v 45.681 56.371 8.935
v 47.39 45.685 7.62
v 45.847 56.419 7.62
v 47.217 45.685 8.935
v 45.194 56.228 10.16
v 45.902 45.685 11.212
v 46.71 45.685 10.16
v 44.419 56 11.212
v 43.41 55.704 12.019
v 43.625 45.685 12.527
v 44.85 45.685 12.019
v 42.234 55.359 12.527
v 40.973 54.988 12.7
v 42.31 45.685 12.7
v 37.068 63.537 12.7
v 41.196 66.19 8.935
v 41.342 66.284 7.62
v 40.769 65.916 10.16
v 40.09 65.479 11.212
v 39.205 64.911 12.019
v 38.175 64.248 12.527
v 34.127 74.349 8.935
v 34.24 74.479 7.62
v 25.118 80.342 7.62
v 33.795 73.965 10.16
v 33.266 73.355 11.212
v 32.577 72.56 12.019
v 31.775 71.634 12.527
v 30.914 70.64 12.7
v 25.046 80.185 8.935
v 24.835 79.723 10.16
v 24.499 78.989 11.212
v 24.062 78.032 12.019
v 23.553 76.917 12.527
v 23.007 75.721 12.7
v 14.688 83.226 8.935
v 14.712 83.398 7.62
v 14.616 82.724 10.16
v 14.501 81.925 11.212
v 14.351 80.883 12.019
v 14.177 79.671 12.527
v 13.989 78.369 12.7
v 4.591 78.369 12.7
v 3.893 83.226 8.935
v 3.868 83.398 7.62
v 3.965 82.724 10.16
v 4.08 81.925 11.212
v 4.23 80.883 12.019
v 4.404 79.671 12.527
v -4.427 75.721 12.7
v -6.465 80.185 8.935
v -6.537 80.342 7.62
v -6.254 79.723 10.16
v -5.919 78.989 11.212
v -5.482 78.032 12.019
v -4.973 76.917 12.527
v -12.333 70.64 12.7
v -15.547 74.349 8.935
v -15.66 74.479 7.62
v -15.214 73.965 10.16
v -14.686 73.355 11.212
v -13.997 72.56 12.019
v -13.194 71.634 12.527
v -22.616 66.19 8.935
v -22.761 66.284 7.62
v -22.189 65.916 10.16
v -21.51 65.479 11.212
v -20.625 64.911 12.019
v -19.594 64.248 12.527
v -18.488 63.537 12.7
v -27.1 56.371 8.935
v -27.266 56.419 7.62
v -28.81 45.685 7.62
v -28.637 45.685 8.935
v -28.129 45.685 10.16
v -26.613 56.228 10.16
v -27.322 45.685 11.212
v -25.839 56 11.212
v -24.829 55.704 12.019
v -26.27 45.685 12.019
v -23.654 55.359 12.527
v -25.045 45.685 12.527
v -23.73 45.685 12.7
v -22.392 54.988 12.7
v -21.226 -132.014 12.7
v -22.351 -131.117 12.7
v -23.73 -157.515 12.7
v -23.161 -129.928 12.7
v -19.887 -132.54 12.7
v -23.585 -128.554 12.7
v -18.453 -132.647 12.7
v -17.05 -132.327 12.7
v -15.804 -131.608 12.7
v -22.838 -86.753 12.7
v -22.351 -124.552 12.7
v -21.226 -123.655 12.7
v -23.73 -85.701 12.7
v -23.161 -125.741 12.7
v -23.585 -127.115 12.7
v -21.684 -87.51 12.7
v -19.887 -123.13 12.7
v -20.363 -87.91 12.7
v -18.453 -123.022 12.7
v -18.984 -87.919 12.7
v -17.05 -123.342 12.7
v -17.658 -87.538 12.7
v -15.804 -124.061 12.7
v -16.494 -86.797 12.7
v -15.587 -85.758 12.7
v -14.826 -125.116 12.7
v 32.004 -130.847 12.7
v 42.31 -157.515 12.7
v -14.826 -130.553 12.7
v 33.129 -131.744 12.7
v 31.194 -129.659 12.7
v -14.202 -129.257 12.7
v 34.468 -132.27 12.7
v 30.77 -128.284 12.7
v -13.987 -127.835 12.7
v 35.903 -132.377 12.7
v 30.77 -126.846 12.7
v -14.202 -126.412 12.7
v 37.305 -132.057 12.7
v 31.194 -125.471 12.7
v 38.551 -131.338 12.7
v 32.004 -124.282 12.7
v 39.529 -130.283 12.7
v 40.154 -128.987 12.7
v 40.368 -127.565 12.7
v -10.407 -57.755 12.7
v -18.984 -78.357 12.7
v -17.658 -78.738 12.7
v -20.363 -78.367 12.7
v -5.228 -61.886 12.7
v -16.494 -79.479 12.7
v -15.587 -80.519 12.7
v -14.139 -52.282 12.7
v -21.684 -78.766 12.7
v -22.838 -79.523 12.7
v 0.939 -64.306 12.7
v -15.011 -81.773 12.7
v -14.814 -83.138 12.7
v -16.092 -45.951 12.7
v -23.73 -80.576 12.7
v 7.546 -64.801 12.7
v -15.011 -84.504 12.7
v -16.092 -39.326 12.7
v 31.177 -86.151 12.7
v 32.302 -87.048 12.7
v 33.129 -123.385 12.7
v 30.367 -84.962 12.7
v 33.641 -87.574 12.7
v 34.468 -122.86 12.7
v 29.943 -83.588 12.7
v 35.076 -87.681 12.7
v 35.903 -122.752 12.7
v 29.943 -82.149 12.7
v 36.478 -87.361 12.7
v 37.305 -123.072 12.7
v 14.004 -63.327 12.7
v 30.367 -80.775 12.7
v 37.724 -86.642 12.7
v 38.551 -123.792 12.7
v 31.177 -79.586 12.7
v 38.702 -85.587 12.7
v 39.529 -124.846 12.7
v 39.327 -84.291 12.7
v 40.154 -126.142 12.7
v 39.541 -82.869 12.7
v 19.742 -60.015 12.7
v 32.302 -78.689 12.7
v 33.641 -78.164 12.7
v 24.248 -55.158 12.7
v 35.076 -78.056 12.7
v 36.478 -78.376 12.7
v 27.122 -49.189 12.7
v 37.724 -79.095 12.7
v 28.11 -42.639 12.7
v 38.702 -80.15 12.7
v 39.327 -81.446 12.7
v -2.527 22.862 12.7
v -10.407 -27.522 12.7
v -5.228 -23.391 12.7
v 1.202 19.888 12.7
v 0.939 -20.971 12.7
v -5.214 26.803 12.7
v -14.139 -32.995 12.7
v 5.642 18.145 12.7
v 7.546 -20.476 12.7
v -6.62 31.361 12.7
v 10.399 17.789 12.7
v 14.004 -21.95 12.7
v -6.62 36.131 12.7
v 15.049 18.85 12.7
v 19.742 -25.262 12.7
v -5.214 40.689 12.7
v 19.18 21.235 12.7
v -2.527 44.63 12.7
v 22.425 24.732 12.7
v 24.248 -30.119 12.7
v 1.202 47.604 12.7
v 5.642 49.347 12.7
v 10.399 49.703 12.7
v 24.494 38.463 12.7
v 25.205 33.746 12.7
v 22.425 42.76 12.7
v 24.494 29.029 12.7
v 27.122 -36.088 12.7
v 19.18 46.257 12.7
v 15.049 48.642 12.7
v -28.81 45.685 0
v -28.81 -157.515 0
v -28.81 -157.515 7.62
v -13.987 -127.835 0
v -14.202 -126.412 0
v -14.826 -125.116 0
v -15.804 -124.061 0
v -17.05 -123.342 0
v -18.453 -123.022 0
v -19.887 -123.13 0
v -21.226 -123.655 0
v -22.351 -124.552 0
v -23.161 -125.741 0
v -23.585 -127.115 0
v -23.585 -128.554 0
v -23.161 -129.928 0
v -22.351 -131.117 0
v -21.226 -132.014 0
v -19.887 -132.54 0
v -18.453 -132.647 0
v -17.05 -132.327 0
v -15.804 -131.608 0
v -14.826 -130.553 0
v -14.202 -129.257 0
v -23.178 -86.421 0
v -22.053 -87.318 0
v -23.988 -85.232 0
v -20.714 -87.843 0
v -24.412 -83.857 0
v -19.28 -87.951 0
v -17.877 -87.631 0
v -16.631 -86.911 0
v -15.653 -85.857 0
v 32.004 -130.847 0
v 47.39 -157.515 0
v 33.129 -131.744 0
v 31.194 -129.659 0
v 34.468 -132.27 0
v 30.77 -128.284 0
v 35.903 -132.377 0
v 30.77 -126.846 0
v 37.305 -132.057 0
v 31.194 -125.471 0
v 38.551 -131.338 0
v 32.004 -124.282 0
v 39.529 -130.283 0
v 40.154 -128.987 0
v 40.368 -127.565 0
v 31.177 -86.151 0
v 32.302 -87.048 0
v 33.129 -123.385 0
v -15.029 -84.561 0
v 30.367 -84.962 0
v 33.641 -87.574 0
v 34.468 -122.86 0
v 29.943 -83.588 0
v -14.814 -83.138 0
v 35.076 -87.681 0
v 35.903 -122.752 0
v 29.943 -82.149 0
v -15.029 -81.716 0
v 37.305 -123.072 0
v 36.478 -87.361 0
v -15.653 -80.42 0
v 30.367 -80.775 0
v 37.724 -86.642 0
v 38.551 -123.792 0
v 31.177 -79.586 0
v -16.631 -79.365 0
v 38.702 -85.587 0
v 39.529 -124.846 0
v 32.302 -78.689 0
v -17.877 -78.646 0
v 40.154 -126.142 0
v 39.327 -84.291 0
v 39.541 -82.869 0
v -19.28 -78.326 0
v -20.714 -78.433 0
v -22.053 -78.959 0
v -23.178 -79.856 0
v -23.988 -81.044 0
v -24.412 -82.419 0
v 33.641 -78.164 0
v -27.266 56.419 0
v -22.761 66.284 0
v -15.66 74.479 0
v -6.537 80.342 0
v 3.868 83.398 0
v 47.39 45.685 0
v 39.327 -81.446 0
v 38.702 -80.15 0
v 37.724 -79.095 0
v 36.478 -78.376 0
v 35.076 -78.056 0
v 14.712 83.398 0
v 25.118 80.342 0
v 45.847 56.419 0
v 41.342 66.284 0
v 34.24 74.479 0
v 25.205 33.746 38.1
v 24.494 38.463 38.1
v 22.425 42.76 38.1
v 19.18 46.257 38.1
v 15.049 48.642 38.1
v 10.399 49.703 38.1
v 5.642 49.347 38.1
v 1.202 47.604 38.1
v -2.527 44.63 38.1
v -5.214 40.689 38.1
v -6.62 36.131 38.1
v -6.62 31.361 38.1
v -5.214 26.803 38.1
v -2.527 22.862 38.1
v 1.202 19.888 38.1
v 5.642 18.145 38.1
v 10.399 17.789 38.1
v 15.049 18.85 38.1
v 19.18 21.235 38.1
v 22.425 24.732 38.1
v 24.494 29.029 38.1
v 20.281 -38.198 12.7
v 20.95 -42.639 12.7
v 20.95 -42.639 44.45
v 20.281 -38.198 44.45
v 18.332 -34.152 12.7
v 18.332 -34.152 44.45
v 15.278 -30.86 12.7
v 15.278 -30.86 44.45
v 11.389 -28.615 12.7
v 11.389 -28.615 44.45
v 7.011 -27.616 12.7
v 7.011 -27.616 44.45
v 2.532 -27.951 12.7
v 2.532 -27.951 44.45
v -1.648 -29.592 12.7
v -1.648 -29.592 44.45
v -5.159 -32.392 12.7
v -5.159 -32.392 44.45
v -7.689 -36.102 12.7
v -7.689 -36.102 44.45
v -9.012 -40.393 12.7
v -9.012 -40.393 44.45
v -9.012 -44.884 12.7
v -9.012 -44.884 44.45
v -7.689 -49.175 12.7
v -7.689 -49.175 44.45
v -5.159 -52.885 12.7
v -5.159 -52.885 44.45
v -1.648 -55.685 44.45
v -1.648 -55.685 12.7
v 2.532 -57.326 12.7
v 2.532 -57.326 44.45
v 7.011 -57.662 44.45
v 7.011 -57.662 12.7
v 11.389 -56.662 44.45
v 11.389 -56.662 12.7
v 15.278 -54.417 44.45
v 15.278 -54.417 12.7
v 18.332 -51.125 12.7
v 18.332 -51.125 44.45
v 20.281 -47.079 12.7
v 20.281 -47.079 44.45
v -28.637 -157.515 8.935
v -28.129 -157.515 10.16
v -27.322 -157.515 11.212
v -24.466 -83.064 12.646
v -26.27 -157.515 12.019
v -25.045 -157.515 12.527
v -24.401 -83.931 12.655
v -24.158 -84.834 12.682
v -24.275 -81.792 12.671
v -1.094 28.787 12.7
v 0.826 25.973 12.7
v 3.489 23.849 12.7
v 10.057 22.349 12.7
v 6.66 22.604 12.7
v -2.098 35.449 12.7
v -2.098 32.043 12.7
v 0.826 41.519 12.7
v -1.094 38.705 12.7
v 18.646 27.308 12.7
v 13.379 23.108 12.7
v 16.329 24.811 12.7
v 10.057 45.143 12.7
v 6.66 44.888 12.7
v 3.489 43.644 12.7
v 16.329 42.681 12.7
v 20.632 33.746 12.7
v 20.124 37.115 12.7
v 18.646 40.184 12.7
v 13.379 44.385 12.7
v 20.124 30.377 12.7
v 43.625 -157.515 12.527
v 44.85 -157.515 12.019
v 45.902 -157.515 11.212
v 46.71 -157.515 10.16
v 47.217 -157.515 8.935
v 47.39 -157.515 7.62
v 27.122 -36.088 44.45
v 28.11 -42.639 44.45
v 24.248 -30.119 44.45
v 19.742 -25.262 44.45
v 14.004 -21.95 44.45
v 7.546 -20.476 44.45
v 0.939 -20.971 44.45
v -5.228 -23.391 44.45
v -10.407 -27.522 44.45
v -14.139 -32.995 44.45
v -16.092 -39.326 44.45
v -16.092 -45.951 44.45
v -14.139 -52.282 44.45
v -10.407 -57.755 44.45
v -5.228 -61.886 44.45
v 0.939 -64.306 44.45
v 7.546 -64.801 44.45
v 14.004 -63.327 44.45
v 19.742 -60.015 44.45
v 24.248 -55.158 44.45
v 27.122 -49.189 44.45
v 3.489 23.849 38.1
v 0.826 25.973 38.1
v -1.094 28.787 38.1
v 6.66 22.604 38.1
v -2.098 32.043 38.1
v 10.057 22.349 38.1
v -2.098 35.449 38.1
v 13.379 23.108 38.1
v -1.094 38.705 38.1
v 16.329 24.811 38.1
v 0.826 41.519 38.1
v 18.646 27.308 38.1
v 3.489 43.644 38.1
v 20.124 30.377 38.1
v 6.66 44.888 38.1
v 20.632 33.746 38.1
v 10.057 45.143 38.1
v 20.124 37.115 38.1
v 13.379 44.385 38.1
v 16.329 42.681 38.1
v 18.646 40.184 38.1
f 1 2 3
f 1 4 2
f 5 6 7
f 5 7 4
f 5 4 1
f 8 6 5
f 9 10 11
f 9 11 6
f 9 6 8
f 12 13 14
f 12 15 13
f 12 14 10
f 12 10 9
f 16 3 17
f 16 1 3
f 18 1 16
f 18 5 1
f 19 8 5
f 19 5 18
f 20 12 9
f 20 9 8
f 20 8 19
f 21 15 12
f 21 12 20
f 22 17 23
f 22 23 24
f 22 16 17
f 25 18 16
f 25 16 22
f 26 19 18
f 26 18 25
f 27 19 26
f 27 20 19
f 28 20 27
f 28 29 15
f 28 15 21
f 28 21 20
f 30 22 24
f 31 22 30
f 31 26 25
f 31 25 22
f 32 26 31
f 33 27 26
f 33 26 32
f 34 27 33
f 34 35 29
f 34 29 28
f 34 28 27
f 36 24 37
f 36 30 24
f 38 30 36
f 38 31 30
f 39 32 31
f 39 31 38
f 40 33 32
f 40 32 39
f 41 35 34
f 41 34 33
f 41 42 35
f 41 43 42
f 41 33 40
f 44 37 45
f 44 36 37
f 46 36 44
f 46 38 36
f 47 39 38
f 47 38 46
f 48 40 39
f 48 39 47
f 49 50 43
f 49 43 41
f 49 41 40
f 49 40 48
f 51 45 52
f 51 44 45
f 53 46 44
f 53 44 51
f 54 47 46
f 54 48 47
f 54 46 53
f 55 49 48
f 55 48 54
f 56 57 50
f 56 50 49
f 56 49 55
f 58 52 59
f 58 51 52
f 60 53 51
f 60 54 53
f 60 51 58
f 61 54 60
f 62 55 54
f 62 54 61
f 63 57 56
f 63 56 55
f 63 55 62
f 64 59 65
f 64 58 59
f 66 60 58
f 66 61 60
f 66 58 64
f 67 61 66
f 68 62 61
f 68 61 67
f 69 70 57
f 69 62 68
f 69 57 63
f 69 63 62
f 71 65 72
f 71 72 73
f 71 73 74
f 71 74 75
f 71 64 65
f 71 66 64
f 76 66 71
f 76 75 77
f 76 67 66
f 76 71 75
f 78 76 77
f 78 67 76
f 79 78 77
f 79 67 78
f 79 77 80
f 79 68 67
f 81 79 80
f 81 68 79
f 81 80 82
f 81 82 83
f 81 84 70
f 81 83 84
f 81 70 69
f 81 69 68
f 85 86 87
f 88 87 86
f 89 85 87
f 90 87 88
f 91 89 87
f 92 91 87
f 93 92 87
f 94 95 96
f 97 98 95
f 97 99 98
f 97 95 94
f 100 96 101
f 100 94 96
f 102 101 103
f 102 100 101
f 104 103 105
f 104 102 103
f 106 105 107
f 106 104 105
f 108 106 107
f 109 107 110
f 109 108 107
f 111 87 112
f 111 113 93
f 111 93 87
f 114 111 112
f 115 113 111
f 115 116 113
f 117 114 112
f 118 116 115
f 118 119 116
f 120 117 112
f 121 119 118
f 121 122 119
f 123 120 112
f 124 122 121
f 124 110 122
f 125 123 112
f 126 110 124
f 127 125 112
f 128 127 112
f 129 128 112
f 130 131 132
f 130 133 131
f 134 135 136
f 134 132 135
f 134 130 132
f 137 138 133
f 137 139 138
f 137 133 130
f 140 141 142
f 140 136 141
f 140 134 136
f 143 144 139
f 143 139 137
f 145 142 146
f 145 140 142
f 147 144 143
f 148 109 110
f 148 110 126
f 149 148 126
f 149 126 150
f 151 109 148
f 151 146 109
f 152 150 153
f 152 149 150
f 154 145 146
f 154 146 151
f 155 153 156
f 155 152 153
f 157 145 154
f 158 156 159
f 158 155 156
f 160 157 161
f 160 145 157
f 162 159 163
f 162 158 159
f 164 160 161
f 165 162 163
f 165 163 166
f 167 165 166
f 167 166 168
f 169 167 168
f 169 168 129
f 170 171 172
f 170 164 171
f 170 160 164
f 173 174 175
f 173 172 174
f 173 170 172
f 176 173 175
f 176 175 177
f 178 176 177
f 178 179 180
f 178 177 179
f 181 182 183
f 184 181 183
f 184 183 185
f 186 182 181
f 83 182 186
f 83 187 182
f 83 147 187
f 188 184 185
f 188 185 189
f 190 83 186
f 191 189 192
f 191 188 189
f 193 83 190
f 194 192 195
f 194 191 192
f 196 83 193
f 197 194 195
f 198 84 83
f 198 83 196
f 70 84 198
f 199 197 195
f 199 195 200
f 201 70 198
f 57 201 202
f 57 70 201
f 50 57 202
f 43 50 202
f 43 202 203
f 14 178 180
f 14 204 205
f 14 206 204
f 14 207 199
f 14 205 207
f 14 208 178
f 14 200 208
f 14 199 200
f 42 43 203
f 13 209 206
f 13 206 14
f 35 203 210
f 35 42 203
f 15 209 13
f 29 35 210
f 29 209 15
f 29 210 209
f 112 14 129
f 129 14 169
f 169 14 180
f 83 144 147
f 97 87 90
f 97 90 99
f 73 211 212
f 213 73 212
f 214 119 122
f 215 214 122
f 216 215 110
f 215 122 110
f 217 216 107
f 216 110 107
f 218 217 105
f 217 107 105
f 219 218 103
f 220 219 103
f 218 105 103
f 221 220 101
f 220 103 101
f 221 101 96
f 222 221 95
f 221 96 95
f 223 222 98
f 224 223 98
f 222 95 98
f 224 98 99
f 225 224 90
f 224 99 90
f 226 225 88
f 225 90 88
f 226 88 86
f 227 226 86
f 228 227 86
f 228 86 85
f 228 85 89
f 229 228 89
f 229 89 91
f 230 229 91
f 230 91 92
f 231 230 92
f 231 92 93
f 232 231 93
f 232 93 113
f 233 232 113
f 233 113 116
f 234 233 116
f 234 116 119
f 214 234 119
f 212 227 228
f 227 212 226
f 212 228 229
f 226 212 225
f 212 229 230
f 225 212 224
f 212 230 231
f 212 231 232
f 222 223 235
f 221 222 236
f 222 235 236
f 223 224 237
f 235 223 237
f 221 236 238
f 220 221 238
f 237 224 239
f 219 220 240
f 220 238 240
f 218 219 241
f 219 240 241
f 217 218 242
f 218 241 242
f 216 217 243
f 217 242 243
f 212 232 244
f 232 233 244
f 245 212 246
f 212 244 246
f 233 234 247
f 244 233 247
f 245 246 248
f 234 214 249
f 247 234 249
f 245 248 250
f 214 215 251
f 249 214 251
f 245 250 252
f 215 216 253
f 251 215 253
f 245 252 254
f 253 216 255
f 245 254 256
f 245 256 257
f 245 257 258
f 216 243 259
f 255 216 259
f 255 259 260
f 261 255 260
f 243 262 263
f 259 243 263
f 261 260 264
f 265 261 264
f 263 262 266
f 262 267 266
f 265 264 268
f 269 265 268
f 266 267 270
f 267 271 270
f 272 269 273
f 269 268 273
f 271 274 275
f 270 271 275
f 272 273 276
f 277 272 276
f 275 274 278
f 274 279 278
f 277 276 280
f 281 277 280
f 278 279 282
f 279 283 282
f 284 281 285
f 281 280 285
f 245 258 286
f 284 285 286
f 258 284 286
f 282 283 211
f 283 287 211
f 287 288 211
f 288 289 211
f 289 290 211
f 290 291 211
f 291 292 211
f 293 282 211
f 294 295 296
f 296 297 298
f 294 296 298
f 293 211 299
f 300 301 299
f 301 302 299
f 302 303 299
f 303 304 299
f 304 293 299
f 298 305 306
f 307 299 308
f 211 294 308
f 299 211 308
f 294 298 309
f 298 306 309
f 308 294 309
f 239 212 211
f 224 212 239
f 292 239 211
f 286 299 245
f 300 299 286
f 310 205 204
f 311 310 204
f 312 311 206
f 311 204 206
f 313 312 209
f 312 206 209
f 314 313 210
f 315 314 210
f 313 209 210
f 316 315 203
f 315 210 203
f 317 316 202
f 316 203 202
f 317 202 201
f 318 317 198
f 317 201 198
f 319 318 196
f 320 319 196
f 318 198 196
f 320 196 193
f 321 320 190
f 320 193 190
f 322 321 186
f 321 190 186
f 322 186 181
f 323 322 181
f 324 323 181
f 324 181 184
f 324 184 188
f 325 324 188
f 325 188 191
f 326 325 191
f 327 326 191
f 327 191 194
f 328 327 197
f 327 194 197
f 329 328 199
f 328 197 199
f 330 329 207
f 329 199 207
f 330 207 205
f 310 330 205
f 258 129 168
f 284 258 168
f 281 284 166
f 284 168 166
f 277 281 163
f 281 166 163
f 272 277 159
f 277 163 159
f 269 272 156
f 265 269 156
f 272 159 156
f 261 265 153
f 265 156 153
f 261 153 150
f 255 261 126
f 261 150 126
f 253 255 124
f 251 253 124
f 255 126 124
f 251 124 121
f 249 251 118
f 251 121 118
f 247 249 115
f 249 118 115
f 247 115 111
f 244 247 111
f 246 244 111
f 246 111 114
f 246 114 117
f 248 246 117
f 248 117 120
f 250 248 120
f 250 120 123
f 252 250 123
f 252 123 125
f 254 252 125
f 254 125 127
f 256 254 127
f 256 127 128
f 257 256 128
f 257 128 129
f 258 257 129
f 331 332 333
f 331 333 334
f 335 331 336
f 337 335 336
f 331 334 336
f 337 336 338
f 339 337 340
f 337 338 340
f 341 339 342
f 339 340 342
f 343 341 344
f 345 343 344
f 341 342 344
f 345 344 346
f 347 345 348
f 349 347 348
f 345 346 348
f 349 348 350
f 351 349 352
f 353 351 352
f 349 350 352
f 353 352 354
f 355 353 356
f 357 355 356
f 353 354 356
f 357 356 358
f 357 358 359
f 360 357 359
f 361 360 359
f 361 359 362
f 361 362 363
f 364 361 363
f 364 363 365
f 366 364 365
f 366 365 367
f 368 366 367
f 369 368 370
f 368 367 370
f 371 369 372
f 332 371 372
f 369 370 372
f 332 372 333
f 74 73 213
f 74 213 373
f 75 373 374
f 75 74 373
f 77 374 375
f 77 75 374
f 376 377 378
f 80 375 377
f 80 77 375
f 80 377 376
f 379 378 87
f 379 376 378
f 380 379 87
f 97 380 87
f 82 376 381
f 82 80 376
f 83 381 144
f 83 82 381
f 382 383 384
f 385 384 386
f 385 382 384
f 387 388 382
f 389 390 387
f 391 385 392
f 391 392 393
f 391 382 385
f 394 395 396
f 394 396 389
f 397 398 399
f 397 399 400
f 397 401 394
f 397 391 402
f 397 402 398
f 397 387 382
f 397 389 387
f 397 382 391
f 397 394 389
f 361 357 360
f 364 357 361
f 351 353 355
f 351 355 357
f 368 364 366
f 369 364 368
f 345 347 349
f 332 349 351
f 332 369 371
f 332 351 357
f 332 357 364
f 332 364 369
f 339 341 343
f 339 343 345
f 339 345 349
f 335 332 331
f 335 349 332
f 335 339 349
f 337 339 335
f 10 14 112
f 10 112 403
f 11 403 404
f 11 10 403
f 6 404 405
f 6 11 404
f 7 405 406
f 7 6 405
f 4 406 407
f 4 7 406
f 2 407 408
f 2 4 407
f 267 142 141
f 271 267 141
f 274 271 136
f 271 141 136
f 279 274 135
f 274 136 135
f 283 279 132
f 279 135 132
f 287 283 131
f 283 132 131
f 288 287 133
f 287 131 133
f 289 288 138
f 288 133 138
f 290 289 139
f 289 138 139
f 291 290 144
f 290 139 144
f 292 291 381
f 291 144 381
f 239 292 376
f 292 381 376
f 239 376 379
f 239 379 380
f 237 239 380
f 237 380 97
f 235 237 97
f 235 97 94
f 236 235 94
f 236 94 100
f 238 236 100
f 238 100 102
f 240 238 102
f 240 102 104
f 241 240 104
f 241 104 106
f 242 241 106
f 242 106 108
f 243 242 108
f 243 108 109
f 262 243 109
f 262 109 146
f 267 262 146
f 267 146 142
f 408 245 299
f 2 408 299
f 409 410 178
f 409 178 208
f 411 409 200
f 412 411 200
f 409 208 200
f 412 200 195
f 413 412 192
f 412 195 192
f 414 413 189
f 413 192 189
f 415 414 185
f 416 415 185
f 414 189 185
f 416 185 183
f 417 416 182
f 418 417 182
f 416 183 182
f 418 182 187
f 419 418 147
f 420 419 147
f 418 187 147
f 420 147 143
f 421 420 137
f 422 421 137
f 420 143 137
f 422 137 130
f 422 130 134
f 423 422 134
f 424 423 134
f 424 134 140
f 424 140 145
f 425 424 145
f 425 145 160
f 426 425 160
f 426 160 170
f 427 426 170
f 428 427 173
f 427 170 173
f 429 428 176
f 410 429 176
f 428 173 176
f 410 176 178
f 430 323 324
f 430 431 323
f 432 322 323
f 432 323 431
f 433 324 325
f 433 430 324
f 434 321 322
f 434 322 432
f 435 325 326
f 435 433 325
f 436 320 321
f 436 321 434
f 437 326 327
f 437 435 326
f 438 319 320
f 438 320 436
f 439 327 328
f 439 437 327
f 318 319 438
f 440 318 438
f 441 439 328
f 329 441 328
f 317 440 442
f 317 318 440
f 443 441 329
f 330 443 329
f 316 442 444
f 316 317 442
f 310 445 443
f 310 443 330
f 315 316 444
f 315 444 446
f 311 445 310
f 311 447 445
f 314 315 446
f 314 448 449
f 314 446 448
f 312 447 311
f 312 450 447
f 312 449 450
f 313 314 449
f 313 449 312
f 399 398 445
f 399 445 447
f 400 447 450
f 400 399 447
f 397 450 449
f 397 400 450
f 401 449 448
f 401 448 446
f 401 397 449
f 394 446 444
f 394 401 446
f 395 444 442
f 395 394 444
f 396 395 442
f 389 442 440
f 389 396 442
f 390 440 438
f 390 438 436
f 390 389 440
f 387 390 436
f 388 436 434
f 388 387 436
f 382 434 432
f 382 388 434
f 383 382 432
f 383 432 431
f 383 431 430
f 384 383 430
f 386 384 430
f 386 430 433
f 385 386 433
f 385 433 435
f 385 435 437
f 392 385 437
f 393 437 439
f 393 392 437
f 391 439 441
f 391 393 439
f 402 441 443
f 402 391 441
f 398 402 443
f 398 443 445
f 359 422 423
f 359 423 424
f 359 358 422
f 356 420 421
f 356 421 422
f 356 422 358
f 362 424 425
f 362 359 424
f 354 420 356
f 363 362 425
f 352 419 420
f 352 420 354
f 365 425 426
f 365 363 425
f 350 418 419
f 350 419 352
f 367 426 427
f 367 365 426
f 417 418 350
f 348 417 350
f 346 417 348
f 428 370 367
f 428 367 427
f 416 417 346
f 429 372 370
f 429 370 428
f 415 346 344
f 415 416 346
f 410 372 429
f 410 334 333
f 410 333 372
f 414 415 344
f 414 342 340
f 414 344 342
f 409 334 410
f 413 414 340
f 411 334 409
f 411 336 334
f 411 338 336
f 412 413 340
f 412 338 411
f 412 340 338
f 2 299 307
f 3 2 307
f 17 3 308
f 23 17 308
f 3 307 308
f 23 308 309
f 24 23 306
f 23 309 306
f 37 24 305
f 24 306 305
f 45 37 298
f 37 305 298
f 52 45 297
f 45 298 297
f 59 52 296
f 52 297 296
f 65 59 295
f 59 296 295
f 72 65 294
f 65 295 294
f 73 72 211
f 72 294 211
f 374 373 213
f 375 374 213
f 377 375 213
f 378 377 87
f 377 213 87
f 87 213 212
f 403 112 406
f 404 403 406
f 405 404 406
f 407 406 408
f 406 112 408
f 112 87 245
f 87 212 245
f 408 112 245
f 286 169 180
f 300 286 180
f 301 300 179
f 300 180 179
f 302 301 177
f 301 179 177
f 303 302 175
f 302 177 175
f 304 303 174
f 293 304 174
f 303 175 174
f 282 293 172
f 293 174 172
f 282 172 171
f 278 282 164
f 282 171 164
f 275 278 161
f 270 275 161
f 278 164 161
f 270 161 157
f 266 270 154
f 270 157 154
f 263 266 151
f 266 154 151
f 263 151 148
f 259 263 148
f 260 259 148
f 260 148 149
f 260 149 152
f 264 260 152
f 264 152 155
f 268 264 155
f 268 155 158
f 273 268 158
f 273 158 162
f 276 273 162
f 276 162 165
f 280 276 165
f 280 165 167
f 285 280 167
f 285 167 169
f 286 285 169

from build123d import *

# Parameters (mm, degrees)
F1_DEPTH     = 12.7
F2_R         = 4.826
F3_DEPTH     = 12.701
F4_R         = 22.225
F5_DEPTH     = 31.75
F6_R         = 16.002
F6_R_2       = 11.4285628251
F7_DEPTH     = 25.4
F8_R         = 15.0651318588
F9_DEPTH     = 31.75
F10_T1_DEPTH = 215.9
F10_T4_ANGLE = 180


# Not quite as in the source:
# - a fillet or chamfer that OpenCascade refuses, or shapes differently, is made with other operations: its cross-section is extruded or revolved along the edge and cut away or added


with BuildPart() as f1:
    # F0 (on Top) → F1 (new body)
    with BuildSketch(Plane.XY):
        with BuildLine():
            Line((-28.8097388059, 45.6853893078), (-28.8097388059, -157.5146106922))
            Line((-28.8097388059, -157.5146106922), (47.3902611941, -157.5146106922))
            Line((47.3902611941, -157.5146106922), (47.3902611941, 45.6853893078))
            ThreePointArc((47.3902611941, 45.6853893078), (9.2902611941, 83.7853893078), (-28.8097388059, 45.6853893078))
        make_face()
    extrude(amount=F1_DEPTH)

    # F2 (on face) → F3 (cut, through all)
    with BuildSketch(Plane.XY.offset(12.7)):
        with Locations((-18.8133654982, -127.8345082872)):
            Circle(F2_R)
        with Locations((35.5419658125, -127.5648898334)):
            Circle(F2_R)
        with Locations((-19.6402604571, -83.1381565264)):
            Circle(F2_R)
        with Locations((34.7150708535, -82.8685380725)):
            Circle(F2_R)
    extrude(amount=-F3_DEPTH, mode=Mode.SUBTRACT)

    # F4 (on face) → F5 (join)
    with BuildSketch(Plane.XY.offset(12.7)):
        with Locations((5.8846990578, -42.6385067403)):
            Circle(F4_R)
    extrude(amount=F5_DEPTH)

    # F6 (on face) → F7 (join)
    with BuildSketch(Plane.XY.offset(12.7)):
        with Locations((9.203276597, 33.7460897863)):
            Circle(F6_R)
        with Locations((9.203276597, 33.7460897863)):
            Circle(F6_R_2, mode=Mode.SUBTRACT)
    extrude(amount=F7_DEPTH)

    # F8 (on face) → F9 (cut)
    with BuildSketch(Plane.XY.offset(44.45)):
        with Locations((5.8846990578, -42.6385067403)):
            Circle(F8_R)
    extrude(amount=-F9_DEPTH, mode=Mode.SUBTRACT)

    # F10: fillet of radius 5.08 on 3 edges, made by hand

    # F10_s2 → F10_t1 (cut)
    with BuildSketch(Plane.XZ.offset(-45.6853893078)):
        with BuildLine():
            ThreePointArc((42.3102611941, 12.7), (45.9023636425, 11.2121024484), (47.3902611941, 7.62))
            Line((47.3902611941, 7.62), (47.3902611941, 12.7))
            Line((47.3902611941, 12.7), (42.3102611941, 12.7))
        make_face()
        with BuildLine():
            ThreePointArc((-28.8097388059, 7.62), (-27.3218412543, 11.2121024484), (-23.7297388059, 12.7))
            Line((-23.7297388059, 12.7), (-28.8097388059, 12.7))
            Line((-28.8097388059, 12.7), (-28.8097388059, 7.62))
        make_face()
    extrude(amount=F10_T1_DEPTH, mode=Mode.SUBTRACT)

    # F10_s3 → F10_t4 (revolve, cut)
    with BuildSketch(Plane.XZ.offset(-45.6853893078)):
        with BuildLine():
            ThreePointArc((47.3902611941, 7.62), (45.9023636425, 11.2121024484), (42.3102611941, 12.7))
            Line((42.3102611941, 12.7), (47.3902611941, 12.7))
            Line((47.3902611941, 12.7), (47.3902611941, 7.62))
        make_face()
    revolve(axis=Axis((9.2902611941, 45.6853893078, 12.7), (0, 0, 1)), revolution_arc=F10_T4_ANGLE, mode=Mode.SUBTRACT)


solid = f1.part
